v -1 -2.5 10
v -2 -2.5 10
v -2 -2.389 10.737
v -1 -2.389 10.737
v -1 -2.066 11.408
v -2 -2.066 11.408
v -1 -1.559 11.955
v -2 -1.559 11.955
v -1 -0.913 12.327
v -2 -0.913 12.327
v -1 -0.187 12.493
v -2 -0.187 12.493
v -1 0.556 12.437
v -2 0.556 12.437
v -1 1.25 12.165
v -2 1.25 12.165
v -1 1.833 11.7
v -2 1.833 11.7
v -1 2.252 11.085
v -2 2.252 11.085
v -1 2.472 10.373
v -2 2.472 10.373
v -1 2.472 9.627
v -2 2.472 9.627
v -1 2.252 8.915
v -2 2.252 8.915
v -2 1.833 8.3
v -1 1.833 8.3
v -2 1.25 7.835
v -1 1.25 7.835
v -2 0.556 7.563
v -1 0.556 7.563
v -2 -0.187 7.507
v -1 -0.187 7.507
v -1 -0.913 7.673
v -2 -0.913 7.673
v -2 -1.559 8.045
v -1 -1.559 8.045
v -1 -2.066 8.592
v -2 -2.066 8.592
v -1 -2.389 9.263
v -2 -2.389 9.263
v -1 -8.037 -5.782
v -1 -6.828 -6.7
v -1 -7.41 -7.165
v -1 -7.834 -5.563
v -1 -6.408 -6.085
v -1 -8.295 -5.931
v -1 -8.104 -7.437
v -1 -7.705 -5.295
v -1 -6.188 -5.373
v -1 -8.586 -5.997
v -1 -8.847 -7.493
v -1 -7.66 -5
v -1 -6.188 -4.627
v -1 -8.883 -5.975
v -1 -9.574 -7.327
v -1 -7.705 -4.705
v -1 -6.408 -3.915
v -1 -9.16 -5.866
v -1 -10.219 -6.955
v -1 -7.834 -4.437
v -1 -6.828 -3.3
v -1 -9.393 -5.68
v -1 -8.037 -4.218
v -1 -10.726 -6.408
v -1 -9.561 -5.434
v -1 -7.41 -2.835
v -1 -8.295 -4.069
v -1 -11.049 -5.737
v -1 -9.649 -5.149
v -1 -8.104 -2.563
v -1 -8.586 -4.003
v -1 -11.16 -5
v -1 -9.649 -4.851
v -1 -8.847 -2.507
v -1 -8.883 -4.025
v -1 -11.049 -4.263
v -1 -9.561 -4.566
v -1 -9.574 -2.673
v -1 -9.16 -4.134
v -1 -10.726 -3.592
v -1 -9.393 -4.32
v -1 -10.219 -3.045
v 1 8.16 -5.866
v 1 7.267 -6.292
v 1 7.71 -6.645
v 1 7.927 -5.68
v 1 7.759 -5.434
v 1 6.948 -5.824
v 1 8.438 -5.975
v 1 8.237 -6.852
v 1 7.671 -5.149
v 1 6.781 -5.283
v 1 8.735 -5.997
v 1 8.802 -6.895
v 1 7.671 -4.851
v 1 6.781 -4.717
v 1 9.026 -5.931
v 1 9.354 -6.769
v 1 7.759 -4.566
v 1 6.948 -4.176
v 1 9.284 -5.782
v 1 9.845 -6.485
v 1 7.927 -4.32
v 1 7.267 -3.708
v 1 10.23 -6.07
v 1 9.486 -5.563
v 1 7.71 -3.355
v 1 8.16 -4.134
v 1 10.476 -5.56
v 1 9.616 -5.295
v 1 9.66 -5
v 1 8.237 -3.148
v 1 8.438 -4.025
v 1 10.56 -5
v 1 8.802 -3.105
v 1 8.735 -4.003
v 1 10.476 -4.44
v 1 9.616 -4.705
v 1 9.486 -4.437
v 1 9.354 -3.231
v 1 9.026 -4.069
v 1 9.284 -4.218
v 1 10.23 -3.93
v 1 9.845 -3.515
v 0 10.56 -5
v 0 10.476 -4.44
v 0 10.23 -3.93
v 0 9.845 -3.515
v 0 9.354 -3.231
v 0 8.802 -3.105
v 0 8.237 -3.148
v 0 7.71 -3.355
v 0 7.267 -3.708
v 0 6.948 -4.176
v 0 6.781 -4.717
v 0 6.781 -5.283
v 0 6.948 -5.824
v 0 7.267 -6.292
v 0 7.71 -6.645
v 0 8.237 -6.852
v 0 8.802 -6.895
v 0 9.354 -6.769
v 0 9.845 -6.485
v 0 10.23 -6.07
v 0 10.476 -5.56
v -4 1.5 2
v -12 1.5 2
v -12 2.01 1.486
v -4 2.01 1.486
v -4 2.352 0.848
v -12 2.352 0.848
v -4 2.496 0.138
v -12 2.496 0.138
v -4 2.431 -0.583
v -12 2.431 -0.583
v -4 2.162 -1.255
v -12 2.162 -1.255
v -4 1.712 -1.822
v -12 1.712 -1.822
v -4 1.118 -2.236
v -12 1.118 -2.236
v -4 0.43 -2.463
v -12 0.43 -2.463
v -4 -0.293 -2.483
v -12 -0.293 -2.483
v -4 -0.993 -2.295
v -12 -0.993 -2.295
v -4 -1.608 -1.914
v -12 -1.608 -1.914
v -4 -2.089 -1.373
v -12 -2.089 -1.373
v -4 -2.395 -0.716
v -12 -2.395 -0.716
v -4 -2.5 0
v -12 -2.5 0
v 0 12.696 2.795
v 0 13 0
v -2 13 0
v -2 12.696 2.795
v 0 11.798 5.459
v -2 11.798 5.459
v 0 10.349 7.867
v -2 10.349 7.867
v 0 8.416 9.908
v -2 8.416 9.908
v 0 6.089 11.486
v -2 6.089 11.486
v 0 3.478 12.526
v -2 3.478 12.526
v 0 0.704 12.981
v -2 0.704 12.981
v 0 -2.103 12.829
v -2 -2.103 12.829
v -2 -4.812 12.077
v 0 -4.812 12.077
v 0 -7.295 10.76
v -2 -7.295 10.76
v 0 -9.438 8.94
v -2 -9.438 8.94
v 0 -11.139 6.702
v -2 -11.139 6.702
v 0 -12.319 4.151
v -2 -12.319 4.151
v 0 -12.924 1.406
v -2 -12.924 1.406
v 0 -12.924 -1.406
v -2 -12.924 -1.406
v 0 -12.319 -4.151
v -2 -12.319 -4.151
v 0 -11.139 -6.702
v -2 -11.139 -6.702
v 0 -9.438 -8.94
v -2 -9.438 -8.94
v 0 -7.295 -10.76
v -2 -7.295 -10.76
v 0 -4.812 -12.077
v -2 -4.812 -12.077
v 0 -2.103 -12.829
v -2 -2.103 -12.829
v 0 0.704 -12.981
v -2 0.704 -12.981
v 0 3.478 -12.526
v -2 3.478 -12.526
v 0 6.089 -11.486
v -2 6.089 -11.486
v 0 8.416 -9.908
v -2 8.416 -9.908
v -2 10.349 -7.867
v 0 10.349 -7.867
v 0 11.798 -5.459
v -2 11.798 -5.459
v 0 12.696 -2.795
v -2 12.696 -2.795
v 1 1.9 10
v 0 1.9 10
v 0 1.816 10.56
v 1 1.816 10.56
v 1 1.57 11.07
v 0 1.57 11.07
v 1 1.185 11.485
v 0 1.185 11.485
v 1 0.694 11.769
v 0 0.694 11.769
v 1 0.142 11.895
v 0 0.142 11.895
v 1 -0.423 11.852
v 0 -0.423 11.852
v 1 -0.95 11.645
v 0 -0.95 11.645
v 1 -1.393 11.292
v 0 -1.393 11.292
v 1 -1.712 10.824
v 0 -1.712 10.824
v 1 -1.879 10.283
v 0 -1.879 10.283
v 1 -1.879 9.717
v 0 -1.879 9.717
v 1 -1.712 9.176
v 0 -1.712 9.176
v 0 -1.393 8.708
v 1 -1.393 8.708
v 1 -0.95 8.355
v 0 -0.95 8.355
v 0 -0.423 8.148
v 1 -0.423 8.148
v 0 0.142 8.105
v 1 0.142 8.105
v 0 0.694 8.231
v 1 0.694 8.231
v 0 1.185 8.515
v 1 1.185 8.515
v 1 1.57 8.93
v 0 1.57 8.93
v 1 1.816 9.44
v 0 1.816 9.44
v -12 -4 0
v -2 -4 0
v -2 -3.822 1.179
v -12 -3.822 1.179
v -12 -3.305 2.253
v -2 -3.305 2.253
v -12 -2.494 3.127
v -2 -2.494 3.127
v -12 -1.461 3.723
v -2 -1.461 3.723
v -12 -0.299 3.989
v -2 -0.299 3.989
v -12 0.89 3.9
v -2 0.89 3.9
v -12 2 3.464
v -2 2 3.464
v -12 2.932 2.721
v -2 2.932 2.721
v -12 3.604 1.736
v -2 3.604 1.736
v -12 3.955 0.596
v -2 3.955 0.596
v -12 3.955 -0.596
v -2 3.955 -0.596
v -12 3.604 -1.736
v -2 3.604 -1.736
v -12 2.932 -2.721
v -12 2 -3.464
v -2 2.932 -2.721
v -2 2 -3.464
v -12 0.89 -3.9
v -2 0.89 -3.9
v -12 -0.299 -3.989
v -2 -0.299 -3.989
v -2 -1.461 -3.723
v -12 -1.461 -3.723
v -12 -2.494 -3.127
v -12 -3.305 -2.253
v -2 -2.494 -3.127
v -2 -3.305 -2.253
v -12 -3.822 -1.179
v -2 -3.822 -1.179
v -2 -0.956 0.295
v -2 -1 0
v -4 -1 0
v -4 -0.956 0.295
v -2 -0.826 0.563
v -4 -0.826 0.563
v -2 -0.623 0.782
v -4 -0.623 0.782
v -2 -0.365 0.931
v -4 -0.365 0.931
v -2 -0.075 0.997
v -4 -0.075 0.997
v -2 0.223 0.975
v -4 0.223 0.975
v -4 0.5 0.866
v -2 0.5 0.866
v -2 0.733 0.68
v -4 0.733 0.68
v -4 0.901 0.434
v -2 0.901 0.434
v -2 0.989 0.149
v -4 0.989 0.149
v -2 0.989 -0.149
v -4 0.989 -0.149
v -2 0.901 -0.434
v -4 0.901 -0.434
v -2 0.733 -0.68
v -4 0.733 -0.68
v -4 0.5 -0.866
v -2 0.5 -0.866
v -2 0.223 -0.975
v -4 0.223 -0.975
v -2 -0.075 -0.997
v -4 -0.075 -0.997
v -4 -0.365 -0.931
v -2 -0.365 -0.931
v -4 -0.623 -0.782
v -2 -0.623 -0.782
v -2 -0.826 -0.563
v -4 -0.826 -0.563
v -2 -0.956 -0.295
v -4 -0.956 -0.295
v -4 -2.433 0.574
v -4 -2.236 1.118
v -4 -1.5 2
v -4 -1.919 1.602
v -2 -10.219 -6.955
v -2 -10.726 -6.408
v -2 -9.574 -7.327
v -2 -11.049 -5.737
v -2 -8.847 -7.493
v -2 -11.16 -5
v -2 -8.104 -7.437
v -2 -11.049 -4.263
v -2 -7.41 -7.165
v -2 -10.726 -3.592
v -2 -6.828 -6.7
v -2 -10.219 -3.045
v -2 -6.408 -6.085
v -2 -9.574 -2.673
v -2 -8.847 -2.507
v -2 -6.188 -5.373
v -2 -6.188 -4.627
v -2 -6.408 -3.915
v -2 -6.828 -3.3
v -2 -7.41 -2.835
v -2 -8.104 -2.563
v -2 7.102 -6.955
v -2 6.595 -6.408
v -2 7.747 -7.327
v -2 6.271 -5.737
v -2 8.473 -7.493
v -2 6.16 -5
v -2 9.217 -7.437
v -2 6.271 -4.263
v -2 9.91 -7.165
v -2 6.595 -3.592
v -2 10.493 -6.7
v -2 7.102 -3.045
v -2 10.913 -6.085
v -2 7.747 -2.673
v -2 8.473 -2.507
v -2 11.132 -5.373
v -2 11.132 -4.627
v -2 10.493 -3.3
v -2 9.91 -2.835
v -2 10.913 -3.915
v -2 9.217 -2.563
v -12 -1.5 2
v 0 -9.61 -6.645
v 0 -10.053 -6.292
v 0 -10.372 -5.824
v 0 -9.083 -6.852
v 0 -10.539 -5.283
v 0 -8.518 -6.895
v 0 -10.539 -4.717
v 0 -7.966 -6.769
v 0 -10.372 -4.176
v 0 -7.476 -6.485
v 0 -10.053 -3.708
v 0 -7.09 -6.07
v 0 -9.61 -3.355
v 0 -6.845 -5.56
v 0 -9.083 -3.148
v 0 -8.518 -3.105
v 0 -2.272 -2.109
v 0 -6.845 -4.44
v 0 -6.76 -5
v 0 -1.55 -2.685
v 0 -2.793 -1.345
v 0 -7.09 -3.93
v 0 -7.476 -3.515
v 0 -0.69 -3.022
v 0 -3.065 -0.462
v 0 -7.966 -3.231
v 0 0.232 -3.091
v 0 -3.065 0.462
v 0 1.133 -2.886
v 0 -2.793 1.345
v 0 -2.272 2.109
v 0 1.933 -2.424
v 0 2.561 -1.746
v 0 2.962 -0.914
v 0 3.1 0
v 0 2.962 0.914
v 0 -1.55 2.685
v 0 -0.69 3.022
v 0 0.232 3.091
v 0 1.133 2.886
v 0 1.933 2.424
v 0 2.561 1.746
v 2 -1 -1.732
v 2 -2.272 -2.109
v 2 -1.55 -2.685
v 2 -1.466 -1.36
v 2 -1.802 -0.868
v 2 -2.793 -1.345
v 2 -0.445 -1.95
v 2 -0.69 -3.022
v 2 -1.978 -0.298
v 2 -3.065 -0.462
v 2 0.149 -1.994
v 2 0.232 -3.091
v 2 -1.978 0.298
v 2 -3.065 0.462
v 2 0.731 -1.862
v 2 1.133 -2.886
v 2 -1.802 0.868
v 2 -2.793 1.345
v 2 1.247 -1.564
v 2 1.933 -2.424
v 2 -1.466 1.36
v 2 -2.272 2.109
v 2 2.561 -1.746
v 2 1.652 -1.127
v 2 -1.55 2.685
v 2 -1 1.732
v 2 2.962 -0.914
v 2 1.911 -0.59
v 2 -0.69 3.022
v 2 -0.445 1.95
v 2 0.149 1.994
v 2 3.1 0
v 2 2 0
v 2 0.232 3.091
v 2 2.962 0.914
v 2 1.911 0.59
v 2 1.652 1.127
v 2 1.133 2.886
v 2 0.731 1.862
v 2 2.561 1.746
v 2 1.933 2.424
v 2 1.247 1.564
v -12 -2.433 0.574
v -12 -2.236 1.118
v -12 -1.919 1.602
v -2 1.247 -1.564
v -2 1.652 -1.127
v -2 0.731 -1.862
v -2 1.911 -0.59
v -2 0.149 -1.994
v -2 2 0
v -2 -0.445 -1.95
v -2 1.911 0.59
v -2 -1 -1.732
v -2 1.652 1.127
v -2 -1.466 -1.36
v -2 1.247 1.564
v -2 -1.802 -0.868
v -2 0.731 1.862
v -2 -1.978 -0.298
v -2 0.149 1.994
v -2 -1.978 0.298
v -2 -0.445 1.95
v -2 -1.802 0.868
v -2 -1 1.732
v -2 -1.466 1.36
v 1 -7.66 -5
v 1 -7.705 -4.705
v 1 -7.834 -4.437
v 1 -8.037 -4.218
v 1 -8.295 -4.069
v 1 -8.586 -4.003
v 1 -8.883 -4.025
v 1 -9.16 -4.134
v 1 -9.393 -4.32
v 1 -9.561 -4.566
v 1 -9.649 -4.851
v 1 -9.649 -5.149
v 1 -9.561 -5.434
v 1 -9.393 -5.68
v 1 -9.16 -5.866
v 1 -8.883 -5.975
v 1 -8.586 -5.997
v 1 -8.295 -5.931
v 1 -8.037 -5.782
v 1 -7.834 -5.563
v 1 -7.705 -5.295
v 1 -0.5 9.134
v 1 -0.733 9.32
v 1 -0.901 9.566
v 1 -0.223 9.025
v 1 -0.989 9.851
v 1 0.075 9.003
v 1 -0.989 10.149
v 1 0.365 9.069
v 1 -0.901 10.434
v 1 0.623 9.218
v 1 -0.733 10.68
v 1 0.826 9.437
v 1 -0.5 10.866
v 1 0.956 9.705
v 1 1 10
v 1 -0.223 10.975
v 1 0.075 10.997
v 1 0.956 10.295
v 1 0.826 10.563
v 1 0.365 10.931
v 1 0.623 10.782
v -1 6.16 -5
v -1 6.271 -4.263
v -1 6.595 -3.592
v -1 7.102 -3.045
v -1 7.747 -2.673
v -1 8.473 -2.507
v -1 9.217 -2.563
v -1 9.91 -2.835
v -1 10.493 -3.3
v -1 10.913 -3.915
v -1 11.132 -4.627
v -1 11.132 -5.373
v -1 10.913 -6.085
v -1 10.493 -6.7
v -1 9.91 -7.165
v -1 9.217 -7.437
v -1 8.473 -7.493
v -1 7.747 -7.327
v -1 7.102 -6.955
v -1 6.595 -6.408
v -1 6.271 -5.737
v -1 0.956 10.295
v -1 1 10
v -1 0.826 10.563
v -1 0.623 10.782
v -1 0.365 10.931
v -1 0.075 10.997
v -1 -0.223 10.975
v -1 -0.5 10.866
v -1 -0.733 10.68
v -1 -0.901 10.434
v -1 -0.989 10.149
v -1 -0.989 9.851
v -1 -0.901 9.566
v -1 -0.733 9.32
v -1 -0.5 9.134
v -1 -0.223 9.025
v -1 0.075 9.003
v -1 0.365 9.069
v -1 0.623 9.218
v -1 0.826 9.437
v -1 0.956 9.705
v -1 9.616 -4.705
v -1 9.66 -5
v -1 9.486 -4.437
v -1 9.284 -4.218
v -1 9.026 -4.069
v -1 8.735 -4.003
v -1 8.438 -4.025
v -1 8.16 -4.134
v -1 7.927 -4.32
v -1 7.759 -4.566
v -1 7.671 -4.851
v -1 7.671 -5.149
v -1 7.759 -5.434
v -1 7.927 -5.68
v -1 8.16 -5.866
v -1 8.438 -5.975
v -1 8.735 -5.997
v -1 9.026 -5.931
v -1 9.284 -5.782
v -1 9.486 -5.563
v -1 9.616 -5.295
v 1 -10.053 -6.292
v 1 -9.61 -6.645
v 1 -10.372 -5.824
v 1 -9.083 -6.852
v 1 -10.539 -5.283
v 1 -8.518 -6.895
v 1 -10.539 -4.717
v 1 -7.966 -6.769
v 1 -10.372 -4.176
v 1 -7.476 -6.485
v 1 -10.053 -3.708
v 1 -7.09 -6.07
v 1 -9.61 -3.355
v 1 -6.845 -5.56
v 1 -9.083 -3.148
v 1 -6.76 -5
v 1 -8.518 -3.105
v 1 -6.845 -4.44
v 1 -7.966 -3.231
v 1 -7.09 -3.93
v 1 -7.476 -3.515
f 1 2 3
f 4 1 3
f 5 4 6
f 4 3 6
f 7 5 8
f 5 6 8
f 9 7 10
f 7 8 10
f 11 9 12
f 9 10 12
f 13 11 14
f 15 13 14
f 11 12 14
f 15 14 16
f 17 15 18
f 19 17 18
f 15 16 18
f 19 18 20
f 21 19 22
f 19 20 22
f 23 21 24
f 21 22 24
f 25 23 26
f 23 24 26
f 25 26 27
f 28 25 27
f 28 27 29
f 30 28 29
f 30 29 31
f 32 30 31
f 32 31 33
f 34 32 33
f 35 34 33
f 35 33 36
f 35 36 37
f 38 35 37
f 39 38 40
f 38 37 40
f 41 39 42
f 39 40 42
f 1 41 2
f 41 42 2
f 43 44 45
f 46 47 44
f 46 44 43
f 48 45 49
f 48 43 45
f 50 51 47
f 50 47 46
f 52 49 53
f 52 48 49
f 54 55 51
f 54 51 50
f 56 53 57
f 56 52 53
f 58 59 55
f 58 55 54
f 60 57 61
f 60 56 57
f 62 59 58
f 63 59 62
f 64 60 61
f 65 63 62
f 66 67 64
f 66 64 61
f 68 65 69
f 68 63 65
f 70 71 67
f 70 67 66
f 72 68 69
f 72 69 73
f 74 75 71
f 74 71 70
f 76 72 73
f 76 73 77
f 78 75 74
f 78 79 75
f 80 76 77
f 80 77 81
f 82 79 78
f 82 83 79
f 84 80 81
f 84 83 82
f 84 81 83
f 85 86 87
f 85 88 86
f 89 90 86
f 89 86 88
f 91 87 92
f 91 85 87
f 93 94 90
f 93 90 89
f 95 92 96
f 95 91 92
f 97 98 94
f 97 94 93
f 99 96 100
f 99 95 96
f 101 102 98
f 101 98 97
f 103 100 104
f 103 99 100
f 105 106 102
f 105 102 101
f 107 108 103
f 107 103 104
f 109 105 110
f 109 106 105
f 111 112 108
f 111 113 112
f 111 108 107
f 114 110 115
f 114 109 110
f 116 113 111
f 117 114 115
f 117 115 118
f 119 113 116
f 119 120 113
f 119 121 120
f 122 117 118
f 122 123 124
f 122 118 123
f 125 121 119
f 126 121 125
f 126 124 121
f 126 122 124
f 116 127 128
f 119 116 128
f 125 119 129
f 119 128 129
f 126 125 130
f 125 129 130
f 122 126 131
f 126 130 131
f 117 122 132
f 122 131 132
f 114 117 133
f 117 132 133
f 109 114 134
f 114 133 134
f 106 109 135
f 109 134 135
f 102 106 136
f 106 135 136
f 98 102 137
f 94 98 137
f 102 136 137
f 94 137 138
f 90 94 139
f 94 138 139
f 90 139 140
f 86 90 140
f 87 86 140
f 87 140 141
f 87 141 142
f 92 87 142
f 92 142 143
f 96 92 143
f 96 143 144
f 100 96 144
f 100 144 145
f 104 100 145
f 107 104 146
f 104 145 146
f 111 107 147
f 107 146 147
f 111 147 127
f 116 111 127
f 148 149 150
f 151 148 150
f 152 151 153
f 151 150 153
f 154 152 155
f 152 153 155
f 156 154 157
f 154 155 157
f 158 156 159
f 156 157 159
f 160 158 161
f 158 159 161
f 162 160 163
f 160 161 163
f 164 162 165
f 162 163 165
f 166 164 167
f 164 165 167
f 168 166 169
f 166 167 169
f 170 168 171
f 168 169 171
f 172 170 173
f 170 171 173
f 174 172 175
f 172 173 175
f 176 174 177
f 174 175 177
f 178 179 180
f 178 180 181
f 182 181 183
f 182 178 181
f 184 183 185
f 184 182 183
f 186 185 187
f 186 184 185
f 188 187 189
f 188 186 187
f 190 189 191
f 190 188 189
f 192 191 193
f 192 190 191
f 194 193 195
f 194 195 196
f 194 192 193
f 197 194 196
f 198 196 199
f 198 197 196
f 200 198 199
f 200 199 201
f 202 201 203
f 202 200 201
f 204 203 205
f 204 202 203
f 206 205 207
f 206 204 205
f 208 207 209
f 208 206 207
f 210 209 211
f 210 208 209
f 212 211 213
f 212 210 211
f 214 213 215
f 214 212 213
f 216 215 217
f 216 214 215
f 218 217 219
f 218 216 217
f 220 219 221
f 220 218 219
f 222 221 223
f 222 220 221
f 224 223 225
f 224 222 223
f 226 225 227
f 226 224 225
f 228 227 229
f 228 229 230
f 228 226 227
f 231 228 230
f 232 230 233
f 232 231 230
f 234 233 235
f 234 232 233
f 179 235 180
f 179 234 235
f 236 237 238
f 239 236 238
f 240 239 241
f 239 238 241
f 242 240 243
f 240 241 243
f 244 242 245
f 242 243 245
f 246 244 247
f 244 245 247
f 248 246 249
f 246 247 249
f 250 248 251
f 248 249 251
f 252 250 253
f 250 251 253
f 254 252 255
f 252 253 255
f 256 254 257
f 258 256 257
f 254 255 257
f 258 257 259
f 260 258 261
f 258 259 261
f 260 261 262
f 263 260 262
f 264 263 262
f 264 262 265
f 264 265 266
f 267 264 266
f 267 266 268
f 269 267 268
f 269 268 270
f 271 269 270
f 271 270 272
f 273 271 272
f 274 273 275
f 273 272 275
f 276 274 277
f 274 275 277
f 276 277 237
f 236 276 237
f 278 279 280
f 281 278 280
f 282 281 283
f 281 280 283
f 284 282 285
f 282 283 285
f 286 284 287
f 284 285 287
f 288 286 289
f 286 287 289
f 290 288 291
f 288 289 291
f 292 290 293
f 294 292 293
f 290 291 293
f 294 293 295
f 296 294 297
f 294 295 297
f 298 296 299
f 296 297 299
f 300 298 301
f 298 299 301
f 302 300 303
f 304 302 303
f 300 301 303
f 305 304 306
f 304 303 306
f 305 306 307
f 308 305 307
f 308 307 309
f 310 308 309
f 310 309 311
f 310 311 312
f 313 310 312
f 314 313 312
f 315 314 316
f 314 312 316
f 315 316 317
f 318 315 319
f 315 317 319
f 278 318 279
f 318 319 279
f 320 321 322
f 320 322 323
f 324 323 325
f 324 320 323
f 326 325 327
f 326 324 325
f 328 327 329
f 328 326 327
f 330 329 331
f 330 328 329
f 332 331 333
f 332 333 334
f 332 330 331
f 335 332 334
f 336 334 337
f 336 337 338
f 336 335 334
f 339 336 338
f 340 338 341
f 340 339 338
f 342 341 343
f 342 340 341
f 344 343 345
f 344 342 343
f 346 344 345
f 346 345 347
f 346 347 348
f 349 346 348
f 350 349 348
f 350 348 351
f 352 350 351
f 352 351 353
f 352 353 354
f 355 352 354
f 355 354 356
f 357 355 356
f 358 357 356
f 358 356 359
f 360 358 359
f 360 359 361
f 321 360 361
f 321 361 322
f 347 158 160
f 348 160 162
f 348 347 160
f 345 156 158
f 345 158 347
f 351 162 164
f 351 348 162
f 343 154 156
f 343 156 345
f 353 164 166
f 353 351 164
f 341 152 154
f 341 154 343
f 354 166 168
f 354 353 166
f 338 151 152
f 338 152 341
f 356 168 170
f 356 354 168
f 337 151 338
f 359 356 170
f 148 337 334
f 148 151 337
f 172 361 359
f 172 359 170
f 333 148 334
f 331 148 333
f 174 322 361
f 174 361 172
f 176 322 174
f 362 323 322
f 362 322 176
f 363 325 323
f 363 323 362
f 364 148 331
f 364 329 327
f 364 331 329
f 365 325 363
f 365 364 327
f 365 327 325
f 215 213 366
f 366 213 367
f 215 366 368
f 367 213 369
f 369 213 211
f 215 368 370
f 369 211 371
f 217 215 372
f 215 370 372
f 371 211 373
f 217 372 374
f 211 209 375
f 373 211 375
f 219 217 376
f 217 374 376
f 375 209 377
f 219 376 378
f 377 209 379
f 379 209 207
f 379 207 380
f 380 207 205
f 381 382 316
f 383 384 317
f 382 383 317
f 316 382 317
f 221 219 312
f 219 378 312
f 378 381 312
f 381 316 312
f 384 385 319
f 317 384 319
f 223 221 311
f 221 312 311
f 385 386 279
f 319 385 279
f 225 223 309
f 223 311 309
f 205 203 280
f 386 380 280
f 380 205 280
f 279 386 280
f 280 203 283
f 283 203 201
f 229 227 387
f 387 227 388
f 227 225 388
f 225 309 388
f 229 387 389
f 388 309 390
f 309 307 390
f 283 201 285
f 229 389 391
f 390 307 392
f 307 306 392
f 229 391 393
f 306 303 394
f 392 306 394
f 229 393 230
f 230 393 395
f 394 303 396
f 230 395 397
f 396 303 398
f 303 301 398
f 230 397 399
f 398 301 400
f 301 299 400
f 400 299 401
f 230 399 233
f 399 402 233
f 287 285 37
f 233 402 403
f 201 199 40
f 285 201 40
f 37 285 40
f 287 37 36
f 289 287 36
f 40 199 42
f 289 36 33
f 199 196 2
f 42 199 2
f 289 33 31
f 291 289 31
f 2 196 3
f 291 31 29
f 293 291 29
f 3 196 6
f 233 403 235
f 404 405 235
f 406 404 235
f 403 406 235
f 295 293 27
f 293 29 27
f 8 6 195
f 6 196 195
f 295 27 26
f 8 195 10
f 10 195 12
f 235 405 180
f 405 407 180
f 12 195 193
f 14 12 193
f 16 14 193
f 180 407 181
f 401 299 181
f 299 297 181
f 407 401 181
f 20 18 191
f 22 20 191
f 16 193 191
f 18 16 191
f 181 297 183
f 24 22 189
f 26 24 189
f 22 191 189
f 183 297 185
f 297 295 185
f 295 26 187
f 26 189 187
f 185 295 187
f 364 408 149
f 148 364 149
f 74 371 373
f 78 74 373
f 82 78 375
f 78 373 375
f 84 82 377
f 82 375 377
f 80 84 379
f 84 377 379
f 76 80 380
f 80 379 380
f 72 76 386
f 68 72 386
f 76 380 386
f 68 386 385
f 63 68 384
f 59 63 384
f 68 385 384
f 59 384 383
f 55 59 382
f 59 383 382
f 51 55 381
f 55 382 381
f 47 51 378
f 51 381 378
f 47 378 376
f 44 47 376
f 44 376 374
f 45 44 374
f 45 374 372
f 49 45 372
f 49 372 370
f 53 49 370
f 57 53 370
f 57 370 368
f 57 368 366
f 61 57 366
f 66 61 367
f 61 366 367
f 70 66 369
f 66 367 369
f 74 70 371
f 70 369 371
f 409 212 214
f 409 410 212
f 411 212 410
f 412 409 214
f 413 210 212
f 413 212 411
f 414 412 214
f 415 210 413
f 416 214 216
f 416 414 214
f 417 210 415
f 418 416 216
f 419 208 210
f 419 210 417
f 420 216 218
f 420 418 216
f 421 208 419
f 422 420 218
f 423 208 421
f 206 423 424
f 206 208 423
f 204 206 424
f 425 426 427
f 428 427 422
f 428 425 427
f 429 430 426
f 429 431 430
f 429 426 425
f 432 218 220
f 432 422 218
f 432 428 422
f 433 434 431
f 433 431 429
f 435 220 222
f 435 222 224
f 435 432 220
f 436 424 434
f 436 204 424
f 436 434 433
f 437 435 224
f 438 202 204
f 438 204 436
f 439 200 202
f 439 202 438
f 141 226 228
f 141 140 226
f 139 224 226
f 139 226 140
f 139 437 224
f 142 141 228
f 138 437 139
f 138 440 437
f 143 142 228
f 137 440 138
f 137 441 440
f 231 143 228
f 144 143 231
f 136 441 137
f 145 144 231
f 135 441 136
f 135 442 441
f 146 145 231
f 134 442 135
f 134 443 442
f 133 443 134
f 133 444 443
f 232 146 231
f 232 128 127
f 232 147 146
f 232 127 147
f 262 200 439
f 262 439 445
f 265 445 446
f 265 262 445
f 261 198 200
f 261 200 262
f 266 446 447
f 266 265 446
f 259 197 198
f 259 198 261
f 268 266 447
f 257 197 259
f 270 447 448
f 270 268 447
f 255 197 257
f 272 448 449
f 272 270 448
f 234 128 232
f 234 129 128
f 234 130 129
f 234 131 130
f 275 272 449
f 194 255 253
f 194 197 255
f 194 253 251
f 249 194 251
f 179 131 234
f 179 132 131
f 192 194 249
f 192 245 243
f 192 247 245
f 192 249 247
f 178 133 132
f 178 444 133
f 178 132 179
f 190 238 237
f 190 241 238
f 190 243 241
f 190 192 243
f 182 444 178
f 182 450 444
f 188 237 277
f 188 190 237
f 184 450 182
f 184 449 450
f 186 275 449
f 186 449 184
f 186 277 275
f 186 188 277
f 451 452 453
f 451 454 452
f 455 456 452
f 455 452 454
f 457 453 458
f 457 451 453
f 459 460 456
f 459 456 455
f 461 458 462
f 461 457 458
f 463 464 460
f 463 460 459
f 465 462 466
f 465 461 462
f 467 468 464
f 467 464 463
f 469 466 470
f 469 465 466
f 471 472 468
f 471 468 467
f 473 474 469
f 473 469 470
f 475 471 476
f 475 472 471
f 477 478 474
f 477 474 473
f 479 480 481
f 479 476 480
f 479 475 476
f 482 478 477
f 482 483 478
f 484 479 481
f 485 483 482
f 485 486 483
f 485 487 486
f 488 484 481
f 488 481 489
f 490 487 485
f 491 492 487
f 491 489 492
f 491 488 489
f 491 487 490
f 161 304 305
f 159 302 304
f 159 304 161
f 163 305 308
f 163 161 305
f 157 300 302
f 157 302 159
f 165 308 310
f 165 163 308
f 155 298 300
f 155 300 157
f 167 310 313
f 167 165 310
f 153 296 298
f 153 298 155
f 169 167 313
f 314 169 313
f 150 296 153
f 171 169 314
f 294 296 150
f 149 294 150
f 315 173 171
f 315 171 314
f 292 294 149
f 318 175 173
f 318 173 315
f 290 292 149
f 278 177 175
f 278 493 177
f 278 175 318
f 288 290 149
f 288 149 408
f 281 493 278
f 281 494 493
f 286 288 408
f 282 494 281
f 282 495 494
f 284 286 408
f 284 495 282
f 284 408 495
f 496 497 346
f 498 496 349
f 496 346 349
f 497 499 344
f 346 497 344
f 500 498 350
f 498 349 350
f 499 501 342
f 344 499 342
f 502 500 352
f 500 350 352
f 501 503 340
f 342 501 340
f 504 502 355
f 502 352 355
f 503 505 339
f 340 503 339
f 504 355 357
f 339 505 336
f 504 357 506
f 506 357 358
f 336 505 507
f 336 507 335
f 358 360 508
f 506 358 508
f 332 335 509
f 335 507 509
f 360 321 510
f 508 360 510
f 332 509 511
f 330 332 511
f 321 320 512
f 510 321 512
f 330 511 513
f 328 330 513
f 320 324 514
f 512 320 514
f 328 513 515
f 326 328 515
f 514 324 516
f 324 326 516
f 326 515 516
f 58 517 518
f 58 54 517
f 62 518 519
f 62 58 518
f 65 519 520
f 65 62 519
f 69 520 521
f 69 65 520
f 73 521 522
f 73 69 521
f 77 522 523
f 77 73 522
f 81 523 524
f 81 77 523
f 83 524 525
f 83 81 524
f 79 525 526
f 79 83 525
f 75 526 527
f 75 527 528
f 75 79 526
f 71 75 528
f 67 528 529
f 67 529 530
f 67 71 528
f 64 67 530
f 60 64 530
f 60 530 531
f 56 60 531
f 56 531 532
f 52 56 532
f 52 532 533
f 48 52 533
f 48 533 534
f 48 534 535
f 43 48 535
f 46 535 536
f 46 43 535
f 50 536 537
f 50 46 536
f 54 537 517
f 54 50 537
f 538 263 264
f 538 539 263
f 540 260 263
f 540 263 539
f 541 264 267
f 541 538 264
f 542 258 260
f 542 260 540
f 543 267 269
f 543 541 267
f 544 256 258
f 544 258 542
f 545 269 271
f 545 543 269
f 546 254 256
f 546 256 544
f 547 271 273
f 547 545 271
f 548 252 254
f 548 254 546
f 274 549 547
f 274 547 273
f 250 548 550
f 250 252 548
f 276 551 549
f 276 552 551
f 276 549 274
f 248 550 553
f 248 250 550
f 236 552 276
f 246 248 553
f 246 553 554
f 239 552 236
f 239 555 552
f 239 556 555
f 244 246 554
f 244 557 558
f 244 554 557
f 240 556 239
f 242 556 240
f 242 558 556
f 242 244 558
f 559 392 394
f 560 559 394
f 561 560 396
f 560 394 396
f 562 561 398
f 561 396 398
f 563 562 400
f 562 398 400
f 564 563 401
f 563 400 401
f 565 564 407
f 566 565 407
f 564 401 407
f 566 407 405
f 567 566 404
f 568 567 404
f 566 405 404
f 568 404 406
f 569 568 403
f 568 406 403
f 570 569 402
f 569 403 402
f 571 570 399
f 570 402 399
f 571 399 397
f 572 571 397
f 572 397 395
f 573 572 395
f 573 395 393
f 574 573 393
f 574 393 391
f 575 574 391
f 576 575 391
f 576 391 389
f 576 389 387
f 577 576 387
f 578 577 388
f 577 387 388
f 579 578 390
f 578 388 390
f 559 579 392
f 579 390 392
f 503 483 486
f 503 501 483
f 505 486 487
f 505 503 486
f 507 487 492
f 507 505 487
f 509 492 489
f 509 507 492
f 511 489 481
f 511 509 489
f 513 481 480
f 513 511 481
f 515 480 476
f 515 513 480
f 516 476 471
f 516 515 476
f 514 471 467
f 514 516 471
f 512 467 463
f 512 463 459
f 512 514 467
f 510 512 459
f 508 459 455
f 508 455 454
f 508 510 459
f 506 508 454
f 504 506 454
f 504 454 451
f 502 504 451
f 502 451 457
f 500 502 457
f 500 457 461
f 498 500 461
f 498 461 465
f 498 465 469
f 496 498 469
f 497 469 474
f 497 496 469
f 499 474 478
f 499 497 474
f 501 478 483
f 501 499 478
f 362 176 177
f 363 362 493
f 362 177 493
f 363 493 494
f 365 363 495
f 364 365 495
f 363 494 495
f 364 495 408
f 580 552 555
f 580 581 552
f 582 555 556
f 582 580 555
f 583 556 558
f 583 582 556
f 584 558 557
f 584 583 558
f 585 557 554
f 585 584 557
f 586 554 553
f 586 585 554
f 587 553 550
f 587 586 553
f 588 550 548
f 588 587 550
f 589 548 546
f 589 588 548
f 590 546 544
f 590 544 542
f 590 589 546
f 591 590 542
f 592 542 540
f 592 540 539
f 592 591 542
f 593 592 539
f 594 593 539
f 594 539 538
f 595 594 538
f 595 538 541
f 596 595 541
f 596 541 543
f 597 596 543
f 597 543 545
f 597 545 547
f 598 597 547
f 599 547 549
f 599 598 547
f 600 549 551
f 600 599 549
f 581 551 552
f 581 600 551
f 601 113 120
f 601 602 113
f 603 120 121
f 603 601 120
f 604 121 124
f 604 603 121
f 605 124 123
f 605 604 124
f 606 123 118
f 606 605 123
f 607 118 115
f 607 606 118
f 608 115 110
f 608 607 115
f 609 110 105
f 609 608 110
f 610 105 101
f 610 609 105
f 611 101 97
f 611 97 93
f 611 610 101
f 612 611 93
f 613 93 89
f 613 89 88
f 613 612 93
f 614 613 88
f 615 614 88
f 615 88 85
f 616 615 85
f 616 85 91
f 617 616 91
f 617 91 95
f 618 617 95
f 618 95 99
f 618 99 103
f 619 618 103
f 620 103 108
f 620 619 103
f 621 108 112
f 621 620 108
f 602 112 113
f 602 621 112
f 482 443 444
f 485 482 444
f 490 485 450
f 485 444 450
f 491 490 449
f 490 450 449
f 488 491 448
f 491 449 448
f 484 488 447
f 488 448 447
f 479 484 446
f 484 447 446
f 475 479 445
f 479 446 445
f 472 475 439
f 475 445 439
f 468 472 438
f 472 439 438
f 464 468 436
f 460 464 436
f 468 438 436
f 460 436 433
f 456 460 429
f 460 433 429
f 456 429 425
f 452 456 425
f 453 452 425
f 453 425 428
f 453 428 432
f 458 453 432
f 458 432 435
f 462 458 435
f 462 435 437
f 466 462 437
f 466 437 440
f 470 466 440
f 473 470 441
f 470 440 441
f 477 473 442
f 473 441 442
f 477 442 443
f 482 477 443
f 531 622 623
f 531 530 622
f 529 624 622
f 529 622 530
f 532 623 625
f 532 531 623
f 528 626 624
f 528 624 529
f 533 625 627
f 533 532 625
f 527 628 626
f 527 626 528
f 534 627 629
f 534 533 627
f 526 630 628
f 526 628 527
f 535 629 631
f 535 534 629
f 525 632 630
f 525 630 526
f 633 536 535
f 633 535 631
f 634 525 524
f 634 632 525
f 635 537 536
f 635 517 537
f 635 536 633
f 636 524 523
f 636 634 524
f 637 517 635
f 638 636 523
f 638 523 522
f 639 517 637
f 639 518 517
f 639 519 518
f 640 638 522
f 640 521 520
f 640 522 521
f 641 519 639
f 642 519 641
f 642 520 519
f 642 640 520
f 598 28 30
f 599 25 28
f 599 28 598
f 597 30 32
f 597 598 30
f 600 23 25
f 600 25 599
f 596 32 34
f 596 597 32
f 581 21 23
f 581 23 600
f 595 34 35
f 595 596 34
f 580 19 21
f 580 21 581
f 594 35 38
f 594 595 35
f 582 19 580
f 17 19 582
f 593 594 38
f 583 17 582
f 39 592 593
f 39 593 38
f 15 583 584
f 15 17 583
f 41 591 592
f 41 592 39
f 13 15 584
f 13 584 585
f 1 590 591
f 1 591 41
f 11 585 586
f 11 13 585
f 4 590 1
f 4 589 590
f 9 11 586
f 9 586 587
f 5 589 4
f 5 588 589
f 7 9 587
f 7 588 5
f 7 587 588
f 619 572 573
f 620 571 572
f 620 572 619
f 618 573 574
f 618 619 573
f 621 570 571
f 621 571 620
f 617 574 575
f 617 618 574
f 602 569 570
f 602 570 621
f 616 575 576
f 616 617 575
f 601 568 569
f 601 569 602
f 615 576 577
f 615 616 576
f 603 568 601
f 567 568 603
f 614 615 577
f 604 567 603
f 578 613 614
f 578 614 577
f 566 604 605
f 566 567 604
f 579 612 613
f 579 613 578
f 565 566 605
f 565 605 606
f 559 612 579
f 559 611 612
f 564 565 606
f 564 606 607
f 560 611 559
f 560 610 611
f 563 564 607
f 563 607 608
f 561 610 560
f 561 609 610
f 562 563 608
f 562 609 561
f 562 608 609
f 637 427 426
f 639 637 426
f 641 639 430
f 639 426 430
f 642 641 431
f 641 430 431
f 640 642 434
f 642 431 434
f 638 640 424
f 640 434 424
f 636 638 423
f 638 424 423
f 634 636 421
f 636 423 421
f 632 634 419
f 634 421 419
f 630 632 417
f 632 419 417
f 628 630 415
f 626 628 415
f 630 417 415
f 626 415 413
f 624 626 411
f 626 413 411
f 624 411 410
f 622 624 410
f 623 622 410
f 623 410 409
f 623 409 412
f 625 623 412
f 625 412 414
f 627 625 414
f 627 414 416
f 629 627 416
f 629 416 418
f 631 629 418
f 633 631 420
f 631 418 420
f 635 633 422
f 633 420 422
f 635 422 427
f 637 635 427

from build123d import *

# Parameters (mm, degrees)
F0_R      = 13
F0_R_2    = 1
F0_R_3    = 2
F1_DEPTH  = 2
F4_R      = 4
F4_R_2    = 1
F5_DEPTH  = 10
F6_R      = 2.5
F6_R_2    = 1
F7_DEPTH  = 1
F8_R      = 1
F9_DEPTH  = 8
F2_R      = 1.9
F2_R_2    = 1
F10_DEPTH = 1
F3_R      = 3.1
F3_R_2    = 2
F11_DEPTH = 2


with BuildPart() as f1:
    # F0 (on Right) → F1 (new body)
    with BuildSketch(Plane.YZ):
        Circle(F0_R)
        with Locations((-8.660254, -5)):
            Circle(F0_R_2, mode=Mode.SUBTRACT)
        with Locations((8.660254, -5)):
            Circle(F0_R_2, mode=Mode.SUBTRACT)
        Circle(F0_R_3, mode=Mode.SUBTRACT)
        with Locations((0, 10)):
            Circle(F0_R_2, mode=Mode.SUBTRACT)
    extrude(amount=-F1_DEPTH)

    # F4 (on face) → F5 (join)
    with BuildSketch(Plane(origin=(-2, 0, 0), x_dir=(0, -1, 0), z_dir=(-1, 0, 0))):
        Circle(F4_R)
        Circle(F4_R_2, mode=Mode.SUBTRACT)
    extrude(amount=F5_DEPTH)

    # F6 (on face) → F7 (cut)
    with BuildSketch(Plane(origin=(-2, 0, 0), x_dir=(0, -1, 0), z_dir=(-1, 0, 0))):
        with Locations((0, 10)):
            Circle(F6_R)
        with Locations((0, 10)):
            Circle(F6_R_2, mode=Mode.SUBTRACT)
        with Locations((8.660254, -5)):
            Circle(F6_R)
        with Locations((8.660254, -5)):
            Circle(F6_R_2, mode=Mode.SUBTRACT)
        with Locations((-8.660254, -5)):
            Circle(F6_R)
        with Locations((-8.660254, -5)):
            Circle(F6_R_2, mode=Mode.SUBTRACT)
    extrude(amount=-F7_DEPTH, mode=Mode.SUBTRACT)

    # F8 (on face) → F9 (cut)
    with BuildSketch(Plane(origin=(-12, 0, 0), x_dir=(0, -1, 0), z_dir=(-1, 0, 0))):
        Circle(F8_R)
        with BuildLine():
            ThreePointArc((-1.5, 2), (-1.118034, -2.236068), (2.5, 0))
            ThreePointArc((2.5, 0), (2.236068, 1.118034), (1.5, 2))
            Line((1.5, 2), (-1.5, 2))
        make_face()
        Circle(F8_R, mode=Mode.SUBTRACT)
    extrude(amount=-F9_DEPTH, mode=Mode.SUBTRACT)

    # F2 (on face) → F10 (join)
    with BuildSketch(Plane.YZ):
        with Locations((0, 10)):
            Circle(F2_R)
        with Locations((0, 10)):
            Circle(F2_R_2, mode=Mode.SUBTRACT)
        with Locations((8.660254, -5)):
            Circle(F2_R)
        with Locations((8.660254, -5)):
            Circle(F2_R_2, mode=Mode.SUBTRACT)
        with Locations((-8.660254, -5)):
            Circle(F2_R)
        with Locations((-8.660254, -5)):
            Circle(F2_R_2, mode=Mode.SUBTRACT)
    extrude(amount=F10_DEPTH)

    # F3 (on face) → F11 (join)
    with BuildSketch(Plane.YZ):
        Circle(F3_R)
        Circle(F3_R_2, mode=Mode.SUBTRACT)
    extrude(amount=F11_DEPTH)


solid = f1.part
